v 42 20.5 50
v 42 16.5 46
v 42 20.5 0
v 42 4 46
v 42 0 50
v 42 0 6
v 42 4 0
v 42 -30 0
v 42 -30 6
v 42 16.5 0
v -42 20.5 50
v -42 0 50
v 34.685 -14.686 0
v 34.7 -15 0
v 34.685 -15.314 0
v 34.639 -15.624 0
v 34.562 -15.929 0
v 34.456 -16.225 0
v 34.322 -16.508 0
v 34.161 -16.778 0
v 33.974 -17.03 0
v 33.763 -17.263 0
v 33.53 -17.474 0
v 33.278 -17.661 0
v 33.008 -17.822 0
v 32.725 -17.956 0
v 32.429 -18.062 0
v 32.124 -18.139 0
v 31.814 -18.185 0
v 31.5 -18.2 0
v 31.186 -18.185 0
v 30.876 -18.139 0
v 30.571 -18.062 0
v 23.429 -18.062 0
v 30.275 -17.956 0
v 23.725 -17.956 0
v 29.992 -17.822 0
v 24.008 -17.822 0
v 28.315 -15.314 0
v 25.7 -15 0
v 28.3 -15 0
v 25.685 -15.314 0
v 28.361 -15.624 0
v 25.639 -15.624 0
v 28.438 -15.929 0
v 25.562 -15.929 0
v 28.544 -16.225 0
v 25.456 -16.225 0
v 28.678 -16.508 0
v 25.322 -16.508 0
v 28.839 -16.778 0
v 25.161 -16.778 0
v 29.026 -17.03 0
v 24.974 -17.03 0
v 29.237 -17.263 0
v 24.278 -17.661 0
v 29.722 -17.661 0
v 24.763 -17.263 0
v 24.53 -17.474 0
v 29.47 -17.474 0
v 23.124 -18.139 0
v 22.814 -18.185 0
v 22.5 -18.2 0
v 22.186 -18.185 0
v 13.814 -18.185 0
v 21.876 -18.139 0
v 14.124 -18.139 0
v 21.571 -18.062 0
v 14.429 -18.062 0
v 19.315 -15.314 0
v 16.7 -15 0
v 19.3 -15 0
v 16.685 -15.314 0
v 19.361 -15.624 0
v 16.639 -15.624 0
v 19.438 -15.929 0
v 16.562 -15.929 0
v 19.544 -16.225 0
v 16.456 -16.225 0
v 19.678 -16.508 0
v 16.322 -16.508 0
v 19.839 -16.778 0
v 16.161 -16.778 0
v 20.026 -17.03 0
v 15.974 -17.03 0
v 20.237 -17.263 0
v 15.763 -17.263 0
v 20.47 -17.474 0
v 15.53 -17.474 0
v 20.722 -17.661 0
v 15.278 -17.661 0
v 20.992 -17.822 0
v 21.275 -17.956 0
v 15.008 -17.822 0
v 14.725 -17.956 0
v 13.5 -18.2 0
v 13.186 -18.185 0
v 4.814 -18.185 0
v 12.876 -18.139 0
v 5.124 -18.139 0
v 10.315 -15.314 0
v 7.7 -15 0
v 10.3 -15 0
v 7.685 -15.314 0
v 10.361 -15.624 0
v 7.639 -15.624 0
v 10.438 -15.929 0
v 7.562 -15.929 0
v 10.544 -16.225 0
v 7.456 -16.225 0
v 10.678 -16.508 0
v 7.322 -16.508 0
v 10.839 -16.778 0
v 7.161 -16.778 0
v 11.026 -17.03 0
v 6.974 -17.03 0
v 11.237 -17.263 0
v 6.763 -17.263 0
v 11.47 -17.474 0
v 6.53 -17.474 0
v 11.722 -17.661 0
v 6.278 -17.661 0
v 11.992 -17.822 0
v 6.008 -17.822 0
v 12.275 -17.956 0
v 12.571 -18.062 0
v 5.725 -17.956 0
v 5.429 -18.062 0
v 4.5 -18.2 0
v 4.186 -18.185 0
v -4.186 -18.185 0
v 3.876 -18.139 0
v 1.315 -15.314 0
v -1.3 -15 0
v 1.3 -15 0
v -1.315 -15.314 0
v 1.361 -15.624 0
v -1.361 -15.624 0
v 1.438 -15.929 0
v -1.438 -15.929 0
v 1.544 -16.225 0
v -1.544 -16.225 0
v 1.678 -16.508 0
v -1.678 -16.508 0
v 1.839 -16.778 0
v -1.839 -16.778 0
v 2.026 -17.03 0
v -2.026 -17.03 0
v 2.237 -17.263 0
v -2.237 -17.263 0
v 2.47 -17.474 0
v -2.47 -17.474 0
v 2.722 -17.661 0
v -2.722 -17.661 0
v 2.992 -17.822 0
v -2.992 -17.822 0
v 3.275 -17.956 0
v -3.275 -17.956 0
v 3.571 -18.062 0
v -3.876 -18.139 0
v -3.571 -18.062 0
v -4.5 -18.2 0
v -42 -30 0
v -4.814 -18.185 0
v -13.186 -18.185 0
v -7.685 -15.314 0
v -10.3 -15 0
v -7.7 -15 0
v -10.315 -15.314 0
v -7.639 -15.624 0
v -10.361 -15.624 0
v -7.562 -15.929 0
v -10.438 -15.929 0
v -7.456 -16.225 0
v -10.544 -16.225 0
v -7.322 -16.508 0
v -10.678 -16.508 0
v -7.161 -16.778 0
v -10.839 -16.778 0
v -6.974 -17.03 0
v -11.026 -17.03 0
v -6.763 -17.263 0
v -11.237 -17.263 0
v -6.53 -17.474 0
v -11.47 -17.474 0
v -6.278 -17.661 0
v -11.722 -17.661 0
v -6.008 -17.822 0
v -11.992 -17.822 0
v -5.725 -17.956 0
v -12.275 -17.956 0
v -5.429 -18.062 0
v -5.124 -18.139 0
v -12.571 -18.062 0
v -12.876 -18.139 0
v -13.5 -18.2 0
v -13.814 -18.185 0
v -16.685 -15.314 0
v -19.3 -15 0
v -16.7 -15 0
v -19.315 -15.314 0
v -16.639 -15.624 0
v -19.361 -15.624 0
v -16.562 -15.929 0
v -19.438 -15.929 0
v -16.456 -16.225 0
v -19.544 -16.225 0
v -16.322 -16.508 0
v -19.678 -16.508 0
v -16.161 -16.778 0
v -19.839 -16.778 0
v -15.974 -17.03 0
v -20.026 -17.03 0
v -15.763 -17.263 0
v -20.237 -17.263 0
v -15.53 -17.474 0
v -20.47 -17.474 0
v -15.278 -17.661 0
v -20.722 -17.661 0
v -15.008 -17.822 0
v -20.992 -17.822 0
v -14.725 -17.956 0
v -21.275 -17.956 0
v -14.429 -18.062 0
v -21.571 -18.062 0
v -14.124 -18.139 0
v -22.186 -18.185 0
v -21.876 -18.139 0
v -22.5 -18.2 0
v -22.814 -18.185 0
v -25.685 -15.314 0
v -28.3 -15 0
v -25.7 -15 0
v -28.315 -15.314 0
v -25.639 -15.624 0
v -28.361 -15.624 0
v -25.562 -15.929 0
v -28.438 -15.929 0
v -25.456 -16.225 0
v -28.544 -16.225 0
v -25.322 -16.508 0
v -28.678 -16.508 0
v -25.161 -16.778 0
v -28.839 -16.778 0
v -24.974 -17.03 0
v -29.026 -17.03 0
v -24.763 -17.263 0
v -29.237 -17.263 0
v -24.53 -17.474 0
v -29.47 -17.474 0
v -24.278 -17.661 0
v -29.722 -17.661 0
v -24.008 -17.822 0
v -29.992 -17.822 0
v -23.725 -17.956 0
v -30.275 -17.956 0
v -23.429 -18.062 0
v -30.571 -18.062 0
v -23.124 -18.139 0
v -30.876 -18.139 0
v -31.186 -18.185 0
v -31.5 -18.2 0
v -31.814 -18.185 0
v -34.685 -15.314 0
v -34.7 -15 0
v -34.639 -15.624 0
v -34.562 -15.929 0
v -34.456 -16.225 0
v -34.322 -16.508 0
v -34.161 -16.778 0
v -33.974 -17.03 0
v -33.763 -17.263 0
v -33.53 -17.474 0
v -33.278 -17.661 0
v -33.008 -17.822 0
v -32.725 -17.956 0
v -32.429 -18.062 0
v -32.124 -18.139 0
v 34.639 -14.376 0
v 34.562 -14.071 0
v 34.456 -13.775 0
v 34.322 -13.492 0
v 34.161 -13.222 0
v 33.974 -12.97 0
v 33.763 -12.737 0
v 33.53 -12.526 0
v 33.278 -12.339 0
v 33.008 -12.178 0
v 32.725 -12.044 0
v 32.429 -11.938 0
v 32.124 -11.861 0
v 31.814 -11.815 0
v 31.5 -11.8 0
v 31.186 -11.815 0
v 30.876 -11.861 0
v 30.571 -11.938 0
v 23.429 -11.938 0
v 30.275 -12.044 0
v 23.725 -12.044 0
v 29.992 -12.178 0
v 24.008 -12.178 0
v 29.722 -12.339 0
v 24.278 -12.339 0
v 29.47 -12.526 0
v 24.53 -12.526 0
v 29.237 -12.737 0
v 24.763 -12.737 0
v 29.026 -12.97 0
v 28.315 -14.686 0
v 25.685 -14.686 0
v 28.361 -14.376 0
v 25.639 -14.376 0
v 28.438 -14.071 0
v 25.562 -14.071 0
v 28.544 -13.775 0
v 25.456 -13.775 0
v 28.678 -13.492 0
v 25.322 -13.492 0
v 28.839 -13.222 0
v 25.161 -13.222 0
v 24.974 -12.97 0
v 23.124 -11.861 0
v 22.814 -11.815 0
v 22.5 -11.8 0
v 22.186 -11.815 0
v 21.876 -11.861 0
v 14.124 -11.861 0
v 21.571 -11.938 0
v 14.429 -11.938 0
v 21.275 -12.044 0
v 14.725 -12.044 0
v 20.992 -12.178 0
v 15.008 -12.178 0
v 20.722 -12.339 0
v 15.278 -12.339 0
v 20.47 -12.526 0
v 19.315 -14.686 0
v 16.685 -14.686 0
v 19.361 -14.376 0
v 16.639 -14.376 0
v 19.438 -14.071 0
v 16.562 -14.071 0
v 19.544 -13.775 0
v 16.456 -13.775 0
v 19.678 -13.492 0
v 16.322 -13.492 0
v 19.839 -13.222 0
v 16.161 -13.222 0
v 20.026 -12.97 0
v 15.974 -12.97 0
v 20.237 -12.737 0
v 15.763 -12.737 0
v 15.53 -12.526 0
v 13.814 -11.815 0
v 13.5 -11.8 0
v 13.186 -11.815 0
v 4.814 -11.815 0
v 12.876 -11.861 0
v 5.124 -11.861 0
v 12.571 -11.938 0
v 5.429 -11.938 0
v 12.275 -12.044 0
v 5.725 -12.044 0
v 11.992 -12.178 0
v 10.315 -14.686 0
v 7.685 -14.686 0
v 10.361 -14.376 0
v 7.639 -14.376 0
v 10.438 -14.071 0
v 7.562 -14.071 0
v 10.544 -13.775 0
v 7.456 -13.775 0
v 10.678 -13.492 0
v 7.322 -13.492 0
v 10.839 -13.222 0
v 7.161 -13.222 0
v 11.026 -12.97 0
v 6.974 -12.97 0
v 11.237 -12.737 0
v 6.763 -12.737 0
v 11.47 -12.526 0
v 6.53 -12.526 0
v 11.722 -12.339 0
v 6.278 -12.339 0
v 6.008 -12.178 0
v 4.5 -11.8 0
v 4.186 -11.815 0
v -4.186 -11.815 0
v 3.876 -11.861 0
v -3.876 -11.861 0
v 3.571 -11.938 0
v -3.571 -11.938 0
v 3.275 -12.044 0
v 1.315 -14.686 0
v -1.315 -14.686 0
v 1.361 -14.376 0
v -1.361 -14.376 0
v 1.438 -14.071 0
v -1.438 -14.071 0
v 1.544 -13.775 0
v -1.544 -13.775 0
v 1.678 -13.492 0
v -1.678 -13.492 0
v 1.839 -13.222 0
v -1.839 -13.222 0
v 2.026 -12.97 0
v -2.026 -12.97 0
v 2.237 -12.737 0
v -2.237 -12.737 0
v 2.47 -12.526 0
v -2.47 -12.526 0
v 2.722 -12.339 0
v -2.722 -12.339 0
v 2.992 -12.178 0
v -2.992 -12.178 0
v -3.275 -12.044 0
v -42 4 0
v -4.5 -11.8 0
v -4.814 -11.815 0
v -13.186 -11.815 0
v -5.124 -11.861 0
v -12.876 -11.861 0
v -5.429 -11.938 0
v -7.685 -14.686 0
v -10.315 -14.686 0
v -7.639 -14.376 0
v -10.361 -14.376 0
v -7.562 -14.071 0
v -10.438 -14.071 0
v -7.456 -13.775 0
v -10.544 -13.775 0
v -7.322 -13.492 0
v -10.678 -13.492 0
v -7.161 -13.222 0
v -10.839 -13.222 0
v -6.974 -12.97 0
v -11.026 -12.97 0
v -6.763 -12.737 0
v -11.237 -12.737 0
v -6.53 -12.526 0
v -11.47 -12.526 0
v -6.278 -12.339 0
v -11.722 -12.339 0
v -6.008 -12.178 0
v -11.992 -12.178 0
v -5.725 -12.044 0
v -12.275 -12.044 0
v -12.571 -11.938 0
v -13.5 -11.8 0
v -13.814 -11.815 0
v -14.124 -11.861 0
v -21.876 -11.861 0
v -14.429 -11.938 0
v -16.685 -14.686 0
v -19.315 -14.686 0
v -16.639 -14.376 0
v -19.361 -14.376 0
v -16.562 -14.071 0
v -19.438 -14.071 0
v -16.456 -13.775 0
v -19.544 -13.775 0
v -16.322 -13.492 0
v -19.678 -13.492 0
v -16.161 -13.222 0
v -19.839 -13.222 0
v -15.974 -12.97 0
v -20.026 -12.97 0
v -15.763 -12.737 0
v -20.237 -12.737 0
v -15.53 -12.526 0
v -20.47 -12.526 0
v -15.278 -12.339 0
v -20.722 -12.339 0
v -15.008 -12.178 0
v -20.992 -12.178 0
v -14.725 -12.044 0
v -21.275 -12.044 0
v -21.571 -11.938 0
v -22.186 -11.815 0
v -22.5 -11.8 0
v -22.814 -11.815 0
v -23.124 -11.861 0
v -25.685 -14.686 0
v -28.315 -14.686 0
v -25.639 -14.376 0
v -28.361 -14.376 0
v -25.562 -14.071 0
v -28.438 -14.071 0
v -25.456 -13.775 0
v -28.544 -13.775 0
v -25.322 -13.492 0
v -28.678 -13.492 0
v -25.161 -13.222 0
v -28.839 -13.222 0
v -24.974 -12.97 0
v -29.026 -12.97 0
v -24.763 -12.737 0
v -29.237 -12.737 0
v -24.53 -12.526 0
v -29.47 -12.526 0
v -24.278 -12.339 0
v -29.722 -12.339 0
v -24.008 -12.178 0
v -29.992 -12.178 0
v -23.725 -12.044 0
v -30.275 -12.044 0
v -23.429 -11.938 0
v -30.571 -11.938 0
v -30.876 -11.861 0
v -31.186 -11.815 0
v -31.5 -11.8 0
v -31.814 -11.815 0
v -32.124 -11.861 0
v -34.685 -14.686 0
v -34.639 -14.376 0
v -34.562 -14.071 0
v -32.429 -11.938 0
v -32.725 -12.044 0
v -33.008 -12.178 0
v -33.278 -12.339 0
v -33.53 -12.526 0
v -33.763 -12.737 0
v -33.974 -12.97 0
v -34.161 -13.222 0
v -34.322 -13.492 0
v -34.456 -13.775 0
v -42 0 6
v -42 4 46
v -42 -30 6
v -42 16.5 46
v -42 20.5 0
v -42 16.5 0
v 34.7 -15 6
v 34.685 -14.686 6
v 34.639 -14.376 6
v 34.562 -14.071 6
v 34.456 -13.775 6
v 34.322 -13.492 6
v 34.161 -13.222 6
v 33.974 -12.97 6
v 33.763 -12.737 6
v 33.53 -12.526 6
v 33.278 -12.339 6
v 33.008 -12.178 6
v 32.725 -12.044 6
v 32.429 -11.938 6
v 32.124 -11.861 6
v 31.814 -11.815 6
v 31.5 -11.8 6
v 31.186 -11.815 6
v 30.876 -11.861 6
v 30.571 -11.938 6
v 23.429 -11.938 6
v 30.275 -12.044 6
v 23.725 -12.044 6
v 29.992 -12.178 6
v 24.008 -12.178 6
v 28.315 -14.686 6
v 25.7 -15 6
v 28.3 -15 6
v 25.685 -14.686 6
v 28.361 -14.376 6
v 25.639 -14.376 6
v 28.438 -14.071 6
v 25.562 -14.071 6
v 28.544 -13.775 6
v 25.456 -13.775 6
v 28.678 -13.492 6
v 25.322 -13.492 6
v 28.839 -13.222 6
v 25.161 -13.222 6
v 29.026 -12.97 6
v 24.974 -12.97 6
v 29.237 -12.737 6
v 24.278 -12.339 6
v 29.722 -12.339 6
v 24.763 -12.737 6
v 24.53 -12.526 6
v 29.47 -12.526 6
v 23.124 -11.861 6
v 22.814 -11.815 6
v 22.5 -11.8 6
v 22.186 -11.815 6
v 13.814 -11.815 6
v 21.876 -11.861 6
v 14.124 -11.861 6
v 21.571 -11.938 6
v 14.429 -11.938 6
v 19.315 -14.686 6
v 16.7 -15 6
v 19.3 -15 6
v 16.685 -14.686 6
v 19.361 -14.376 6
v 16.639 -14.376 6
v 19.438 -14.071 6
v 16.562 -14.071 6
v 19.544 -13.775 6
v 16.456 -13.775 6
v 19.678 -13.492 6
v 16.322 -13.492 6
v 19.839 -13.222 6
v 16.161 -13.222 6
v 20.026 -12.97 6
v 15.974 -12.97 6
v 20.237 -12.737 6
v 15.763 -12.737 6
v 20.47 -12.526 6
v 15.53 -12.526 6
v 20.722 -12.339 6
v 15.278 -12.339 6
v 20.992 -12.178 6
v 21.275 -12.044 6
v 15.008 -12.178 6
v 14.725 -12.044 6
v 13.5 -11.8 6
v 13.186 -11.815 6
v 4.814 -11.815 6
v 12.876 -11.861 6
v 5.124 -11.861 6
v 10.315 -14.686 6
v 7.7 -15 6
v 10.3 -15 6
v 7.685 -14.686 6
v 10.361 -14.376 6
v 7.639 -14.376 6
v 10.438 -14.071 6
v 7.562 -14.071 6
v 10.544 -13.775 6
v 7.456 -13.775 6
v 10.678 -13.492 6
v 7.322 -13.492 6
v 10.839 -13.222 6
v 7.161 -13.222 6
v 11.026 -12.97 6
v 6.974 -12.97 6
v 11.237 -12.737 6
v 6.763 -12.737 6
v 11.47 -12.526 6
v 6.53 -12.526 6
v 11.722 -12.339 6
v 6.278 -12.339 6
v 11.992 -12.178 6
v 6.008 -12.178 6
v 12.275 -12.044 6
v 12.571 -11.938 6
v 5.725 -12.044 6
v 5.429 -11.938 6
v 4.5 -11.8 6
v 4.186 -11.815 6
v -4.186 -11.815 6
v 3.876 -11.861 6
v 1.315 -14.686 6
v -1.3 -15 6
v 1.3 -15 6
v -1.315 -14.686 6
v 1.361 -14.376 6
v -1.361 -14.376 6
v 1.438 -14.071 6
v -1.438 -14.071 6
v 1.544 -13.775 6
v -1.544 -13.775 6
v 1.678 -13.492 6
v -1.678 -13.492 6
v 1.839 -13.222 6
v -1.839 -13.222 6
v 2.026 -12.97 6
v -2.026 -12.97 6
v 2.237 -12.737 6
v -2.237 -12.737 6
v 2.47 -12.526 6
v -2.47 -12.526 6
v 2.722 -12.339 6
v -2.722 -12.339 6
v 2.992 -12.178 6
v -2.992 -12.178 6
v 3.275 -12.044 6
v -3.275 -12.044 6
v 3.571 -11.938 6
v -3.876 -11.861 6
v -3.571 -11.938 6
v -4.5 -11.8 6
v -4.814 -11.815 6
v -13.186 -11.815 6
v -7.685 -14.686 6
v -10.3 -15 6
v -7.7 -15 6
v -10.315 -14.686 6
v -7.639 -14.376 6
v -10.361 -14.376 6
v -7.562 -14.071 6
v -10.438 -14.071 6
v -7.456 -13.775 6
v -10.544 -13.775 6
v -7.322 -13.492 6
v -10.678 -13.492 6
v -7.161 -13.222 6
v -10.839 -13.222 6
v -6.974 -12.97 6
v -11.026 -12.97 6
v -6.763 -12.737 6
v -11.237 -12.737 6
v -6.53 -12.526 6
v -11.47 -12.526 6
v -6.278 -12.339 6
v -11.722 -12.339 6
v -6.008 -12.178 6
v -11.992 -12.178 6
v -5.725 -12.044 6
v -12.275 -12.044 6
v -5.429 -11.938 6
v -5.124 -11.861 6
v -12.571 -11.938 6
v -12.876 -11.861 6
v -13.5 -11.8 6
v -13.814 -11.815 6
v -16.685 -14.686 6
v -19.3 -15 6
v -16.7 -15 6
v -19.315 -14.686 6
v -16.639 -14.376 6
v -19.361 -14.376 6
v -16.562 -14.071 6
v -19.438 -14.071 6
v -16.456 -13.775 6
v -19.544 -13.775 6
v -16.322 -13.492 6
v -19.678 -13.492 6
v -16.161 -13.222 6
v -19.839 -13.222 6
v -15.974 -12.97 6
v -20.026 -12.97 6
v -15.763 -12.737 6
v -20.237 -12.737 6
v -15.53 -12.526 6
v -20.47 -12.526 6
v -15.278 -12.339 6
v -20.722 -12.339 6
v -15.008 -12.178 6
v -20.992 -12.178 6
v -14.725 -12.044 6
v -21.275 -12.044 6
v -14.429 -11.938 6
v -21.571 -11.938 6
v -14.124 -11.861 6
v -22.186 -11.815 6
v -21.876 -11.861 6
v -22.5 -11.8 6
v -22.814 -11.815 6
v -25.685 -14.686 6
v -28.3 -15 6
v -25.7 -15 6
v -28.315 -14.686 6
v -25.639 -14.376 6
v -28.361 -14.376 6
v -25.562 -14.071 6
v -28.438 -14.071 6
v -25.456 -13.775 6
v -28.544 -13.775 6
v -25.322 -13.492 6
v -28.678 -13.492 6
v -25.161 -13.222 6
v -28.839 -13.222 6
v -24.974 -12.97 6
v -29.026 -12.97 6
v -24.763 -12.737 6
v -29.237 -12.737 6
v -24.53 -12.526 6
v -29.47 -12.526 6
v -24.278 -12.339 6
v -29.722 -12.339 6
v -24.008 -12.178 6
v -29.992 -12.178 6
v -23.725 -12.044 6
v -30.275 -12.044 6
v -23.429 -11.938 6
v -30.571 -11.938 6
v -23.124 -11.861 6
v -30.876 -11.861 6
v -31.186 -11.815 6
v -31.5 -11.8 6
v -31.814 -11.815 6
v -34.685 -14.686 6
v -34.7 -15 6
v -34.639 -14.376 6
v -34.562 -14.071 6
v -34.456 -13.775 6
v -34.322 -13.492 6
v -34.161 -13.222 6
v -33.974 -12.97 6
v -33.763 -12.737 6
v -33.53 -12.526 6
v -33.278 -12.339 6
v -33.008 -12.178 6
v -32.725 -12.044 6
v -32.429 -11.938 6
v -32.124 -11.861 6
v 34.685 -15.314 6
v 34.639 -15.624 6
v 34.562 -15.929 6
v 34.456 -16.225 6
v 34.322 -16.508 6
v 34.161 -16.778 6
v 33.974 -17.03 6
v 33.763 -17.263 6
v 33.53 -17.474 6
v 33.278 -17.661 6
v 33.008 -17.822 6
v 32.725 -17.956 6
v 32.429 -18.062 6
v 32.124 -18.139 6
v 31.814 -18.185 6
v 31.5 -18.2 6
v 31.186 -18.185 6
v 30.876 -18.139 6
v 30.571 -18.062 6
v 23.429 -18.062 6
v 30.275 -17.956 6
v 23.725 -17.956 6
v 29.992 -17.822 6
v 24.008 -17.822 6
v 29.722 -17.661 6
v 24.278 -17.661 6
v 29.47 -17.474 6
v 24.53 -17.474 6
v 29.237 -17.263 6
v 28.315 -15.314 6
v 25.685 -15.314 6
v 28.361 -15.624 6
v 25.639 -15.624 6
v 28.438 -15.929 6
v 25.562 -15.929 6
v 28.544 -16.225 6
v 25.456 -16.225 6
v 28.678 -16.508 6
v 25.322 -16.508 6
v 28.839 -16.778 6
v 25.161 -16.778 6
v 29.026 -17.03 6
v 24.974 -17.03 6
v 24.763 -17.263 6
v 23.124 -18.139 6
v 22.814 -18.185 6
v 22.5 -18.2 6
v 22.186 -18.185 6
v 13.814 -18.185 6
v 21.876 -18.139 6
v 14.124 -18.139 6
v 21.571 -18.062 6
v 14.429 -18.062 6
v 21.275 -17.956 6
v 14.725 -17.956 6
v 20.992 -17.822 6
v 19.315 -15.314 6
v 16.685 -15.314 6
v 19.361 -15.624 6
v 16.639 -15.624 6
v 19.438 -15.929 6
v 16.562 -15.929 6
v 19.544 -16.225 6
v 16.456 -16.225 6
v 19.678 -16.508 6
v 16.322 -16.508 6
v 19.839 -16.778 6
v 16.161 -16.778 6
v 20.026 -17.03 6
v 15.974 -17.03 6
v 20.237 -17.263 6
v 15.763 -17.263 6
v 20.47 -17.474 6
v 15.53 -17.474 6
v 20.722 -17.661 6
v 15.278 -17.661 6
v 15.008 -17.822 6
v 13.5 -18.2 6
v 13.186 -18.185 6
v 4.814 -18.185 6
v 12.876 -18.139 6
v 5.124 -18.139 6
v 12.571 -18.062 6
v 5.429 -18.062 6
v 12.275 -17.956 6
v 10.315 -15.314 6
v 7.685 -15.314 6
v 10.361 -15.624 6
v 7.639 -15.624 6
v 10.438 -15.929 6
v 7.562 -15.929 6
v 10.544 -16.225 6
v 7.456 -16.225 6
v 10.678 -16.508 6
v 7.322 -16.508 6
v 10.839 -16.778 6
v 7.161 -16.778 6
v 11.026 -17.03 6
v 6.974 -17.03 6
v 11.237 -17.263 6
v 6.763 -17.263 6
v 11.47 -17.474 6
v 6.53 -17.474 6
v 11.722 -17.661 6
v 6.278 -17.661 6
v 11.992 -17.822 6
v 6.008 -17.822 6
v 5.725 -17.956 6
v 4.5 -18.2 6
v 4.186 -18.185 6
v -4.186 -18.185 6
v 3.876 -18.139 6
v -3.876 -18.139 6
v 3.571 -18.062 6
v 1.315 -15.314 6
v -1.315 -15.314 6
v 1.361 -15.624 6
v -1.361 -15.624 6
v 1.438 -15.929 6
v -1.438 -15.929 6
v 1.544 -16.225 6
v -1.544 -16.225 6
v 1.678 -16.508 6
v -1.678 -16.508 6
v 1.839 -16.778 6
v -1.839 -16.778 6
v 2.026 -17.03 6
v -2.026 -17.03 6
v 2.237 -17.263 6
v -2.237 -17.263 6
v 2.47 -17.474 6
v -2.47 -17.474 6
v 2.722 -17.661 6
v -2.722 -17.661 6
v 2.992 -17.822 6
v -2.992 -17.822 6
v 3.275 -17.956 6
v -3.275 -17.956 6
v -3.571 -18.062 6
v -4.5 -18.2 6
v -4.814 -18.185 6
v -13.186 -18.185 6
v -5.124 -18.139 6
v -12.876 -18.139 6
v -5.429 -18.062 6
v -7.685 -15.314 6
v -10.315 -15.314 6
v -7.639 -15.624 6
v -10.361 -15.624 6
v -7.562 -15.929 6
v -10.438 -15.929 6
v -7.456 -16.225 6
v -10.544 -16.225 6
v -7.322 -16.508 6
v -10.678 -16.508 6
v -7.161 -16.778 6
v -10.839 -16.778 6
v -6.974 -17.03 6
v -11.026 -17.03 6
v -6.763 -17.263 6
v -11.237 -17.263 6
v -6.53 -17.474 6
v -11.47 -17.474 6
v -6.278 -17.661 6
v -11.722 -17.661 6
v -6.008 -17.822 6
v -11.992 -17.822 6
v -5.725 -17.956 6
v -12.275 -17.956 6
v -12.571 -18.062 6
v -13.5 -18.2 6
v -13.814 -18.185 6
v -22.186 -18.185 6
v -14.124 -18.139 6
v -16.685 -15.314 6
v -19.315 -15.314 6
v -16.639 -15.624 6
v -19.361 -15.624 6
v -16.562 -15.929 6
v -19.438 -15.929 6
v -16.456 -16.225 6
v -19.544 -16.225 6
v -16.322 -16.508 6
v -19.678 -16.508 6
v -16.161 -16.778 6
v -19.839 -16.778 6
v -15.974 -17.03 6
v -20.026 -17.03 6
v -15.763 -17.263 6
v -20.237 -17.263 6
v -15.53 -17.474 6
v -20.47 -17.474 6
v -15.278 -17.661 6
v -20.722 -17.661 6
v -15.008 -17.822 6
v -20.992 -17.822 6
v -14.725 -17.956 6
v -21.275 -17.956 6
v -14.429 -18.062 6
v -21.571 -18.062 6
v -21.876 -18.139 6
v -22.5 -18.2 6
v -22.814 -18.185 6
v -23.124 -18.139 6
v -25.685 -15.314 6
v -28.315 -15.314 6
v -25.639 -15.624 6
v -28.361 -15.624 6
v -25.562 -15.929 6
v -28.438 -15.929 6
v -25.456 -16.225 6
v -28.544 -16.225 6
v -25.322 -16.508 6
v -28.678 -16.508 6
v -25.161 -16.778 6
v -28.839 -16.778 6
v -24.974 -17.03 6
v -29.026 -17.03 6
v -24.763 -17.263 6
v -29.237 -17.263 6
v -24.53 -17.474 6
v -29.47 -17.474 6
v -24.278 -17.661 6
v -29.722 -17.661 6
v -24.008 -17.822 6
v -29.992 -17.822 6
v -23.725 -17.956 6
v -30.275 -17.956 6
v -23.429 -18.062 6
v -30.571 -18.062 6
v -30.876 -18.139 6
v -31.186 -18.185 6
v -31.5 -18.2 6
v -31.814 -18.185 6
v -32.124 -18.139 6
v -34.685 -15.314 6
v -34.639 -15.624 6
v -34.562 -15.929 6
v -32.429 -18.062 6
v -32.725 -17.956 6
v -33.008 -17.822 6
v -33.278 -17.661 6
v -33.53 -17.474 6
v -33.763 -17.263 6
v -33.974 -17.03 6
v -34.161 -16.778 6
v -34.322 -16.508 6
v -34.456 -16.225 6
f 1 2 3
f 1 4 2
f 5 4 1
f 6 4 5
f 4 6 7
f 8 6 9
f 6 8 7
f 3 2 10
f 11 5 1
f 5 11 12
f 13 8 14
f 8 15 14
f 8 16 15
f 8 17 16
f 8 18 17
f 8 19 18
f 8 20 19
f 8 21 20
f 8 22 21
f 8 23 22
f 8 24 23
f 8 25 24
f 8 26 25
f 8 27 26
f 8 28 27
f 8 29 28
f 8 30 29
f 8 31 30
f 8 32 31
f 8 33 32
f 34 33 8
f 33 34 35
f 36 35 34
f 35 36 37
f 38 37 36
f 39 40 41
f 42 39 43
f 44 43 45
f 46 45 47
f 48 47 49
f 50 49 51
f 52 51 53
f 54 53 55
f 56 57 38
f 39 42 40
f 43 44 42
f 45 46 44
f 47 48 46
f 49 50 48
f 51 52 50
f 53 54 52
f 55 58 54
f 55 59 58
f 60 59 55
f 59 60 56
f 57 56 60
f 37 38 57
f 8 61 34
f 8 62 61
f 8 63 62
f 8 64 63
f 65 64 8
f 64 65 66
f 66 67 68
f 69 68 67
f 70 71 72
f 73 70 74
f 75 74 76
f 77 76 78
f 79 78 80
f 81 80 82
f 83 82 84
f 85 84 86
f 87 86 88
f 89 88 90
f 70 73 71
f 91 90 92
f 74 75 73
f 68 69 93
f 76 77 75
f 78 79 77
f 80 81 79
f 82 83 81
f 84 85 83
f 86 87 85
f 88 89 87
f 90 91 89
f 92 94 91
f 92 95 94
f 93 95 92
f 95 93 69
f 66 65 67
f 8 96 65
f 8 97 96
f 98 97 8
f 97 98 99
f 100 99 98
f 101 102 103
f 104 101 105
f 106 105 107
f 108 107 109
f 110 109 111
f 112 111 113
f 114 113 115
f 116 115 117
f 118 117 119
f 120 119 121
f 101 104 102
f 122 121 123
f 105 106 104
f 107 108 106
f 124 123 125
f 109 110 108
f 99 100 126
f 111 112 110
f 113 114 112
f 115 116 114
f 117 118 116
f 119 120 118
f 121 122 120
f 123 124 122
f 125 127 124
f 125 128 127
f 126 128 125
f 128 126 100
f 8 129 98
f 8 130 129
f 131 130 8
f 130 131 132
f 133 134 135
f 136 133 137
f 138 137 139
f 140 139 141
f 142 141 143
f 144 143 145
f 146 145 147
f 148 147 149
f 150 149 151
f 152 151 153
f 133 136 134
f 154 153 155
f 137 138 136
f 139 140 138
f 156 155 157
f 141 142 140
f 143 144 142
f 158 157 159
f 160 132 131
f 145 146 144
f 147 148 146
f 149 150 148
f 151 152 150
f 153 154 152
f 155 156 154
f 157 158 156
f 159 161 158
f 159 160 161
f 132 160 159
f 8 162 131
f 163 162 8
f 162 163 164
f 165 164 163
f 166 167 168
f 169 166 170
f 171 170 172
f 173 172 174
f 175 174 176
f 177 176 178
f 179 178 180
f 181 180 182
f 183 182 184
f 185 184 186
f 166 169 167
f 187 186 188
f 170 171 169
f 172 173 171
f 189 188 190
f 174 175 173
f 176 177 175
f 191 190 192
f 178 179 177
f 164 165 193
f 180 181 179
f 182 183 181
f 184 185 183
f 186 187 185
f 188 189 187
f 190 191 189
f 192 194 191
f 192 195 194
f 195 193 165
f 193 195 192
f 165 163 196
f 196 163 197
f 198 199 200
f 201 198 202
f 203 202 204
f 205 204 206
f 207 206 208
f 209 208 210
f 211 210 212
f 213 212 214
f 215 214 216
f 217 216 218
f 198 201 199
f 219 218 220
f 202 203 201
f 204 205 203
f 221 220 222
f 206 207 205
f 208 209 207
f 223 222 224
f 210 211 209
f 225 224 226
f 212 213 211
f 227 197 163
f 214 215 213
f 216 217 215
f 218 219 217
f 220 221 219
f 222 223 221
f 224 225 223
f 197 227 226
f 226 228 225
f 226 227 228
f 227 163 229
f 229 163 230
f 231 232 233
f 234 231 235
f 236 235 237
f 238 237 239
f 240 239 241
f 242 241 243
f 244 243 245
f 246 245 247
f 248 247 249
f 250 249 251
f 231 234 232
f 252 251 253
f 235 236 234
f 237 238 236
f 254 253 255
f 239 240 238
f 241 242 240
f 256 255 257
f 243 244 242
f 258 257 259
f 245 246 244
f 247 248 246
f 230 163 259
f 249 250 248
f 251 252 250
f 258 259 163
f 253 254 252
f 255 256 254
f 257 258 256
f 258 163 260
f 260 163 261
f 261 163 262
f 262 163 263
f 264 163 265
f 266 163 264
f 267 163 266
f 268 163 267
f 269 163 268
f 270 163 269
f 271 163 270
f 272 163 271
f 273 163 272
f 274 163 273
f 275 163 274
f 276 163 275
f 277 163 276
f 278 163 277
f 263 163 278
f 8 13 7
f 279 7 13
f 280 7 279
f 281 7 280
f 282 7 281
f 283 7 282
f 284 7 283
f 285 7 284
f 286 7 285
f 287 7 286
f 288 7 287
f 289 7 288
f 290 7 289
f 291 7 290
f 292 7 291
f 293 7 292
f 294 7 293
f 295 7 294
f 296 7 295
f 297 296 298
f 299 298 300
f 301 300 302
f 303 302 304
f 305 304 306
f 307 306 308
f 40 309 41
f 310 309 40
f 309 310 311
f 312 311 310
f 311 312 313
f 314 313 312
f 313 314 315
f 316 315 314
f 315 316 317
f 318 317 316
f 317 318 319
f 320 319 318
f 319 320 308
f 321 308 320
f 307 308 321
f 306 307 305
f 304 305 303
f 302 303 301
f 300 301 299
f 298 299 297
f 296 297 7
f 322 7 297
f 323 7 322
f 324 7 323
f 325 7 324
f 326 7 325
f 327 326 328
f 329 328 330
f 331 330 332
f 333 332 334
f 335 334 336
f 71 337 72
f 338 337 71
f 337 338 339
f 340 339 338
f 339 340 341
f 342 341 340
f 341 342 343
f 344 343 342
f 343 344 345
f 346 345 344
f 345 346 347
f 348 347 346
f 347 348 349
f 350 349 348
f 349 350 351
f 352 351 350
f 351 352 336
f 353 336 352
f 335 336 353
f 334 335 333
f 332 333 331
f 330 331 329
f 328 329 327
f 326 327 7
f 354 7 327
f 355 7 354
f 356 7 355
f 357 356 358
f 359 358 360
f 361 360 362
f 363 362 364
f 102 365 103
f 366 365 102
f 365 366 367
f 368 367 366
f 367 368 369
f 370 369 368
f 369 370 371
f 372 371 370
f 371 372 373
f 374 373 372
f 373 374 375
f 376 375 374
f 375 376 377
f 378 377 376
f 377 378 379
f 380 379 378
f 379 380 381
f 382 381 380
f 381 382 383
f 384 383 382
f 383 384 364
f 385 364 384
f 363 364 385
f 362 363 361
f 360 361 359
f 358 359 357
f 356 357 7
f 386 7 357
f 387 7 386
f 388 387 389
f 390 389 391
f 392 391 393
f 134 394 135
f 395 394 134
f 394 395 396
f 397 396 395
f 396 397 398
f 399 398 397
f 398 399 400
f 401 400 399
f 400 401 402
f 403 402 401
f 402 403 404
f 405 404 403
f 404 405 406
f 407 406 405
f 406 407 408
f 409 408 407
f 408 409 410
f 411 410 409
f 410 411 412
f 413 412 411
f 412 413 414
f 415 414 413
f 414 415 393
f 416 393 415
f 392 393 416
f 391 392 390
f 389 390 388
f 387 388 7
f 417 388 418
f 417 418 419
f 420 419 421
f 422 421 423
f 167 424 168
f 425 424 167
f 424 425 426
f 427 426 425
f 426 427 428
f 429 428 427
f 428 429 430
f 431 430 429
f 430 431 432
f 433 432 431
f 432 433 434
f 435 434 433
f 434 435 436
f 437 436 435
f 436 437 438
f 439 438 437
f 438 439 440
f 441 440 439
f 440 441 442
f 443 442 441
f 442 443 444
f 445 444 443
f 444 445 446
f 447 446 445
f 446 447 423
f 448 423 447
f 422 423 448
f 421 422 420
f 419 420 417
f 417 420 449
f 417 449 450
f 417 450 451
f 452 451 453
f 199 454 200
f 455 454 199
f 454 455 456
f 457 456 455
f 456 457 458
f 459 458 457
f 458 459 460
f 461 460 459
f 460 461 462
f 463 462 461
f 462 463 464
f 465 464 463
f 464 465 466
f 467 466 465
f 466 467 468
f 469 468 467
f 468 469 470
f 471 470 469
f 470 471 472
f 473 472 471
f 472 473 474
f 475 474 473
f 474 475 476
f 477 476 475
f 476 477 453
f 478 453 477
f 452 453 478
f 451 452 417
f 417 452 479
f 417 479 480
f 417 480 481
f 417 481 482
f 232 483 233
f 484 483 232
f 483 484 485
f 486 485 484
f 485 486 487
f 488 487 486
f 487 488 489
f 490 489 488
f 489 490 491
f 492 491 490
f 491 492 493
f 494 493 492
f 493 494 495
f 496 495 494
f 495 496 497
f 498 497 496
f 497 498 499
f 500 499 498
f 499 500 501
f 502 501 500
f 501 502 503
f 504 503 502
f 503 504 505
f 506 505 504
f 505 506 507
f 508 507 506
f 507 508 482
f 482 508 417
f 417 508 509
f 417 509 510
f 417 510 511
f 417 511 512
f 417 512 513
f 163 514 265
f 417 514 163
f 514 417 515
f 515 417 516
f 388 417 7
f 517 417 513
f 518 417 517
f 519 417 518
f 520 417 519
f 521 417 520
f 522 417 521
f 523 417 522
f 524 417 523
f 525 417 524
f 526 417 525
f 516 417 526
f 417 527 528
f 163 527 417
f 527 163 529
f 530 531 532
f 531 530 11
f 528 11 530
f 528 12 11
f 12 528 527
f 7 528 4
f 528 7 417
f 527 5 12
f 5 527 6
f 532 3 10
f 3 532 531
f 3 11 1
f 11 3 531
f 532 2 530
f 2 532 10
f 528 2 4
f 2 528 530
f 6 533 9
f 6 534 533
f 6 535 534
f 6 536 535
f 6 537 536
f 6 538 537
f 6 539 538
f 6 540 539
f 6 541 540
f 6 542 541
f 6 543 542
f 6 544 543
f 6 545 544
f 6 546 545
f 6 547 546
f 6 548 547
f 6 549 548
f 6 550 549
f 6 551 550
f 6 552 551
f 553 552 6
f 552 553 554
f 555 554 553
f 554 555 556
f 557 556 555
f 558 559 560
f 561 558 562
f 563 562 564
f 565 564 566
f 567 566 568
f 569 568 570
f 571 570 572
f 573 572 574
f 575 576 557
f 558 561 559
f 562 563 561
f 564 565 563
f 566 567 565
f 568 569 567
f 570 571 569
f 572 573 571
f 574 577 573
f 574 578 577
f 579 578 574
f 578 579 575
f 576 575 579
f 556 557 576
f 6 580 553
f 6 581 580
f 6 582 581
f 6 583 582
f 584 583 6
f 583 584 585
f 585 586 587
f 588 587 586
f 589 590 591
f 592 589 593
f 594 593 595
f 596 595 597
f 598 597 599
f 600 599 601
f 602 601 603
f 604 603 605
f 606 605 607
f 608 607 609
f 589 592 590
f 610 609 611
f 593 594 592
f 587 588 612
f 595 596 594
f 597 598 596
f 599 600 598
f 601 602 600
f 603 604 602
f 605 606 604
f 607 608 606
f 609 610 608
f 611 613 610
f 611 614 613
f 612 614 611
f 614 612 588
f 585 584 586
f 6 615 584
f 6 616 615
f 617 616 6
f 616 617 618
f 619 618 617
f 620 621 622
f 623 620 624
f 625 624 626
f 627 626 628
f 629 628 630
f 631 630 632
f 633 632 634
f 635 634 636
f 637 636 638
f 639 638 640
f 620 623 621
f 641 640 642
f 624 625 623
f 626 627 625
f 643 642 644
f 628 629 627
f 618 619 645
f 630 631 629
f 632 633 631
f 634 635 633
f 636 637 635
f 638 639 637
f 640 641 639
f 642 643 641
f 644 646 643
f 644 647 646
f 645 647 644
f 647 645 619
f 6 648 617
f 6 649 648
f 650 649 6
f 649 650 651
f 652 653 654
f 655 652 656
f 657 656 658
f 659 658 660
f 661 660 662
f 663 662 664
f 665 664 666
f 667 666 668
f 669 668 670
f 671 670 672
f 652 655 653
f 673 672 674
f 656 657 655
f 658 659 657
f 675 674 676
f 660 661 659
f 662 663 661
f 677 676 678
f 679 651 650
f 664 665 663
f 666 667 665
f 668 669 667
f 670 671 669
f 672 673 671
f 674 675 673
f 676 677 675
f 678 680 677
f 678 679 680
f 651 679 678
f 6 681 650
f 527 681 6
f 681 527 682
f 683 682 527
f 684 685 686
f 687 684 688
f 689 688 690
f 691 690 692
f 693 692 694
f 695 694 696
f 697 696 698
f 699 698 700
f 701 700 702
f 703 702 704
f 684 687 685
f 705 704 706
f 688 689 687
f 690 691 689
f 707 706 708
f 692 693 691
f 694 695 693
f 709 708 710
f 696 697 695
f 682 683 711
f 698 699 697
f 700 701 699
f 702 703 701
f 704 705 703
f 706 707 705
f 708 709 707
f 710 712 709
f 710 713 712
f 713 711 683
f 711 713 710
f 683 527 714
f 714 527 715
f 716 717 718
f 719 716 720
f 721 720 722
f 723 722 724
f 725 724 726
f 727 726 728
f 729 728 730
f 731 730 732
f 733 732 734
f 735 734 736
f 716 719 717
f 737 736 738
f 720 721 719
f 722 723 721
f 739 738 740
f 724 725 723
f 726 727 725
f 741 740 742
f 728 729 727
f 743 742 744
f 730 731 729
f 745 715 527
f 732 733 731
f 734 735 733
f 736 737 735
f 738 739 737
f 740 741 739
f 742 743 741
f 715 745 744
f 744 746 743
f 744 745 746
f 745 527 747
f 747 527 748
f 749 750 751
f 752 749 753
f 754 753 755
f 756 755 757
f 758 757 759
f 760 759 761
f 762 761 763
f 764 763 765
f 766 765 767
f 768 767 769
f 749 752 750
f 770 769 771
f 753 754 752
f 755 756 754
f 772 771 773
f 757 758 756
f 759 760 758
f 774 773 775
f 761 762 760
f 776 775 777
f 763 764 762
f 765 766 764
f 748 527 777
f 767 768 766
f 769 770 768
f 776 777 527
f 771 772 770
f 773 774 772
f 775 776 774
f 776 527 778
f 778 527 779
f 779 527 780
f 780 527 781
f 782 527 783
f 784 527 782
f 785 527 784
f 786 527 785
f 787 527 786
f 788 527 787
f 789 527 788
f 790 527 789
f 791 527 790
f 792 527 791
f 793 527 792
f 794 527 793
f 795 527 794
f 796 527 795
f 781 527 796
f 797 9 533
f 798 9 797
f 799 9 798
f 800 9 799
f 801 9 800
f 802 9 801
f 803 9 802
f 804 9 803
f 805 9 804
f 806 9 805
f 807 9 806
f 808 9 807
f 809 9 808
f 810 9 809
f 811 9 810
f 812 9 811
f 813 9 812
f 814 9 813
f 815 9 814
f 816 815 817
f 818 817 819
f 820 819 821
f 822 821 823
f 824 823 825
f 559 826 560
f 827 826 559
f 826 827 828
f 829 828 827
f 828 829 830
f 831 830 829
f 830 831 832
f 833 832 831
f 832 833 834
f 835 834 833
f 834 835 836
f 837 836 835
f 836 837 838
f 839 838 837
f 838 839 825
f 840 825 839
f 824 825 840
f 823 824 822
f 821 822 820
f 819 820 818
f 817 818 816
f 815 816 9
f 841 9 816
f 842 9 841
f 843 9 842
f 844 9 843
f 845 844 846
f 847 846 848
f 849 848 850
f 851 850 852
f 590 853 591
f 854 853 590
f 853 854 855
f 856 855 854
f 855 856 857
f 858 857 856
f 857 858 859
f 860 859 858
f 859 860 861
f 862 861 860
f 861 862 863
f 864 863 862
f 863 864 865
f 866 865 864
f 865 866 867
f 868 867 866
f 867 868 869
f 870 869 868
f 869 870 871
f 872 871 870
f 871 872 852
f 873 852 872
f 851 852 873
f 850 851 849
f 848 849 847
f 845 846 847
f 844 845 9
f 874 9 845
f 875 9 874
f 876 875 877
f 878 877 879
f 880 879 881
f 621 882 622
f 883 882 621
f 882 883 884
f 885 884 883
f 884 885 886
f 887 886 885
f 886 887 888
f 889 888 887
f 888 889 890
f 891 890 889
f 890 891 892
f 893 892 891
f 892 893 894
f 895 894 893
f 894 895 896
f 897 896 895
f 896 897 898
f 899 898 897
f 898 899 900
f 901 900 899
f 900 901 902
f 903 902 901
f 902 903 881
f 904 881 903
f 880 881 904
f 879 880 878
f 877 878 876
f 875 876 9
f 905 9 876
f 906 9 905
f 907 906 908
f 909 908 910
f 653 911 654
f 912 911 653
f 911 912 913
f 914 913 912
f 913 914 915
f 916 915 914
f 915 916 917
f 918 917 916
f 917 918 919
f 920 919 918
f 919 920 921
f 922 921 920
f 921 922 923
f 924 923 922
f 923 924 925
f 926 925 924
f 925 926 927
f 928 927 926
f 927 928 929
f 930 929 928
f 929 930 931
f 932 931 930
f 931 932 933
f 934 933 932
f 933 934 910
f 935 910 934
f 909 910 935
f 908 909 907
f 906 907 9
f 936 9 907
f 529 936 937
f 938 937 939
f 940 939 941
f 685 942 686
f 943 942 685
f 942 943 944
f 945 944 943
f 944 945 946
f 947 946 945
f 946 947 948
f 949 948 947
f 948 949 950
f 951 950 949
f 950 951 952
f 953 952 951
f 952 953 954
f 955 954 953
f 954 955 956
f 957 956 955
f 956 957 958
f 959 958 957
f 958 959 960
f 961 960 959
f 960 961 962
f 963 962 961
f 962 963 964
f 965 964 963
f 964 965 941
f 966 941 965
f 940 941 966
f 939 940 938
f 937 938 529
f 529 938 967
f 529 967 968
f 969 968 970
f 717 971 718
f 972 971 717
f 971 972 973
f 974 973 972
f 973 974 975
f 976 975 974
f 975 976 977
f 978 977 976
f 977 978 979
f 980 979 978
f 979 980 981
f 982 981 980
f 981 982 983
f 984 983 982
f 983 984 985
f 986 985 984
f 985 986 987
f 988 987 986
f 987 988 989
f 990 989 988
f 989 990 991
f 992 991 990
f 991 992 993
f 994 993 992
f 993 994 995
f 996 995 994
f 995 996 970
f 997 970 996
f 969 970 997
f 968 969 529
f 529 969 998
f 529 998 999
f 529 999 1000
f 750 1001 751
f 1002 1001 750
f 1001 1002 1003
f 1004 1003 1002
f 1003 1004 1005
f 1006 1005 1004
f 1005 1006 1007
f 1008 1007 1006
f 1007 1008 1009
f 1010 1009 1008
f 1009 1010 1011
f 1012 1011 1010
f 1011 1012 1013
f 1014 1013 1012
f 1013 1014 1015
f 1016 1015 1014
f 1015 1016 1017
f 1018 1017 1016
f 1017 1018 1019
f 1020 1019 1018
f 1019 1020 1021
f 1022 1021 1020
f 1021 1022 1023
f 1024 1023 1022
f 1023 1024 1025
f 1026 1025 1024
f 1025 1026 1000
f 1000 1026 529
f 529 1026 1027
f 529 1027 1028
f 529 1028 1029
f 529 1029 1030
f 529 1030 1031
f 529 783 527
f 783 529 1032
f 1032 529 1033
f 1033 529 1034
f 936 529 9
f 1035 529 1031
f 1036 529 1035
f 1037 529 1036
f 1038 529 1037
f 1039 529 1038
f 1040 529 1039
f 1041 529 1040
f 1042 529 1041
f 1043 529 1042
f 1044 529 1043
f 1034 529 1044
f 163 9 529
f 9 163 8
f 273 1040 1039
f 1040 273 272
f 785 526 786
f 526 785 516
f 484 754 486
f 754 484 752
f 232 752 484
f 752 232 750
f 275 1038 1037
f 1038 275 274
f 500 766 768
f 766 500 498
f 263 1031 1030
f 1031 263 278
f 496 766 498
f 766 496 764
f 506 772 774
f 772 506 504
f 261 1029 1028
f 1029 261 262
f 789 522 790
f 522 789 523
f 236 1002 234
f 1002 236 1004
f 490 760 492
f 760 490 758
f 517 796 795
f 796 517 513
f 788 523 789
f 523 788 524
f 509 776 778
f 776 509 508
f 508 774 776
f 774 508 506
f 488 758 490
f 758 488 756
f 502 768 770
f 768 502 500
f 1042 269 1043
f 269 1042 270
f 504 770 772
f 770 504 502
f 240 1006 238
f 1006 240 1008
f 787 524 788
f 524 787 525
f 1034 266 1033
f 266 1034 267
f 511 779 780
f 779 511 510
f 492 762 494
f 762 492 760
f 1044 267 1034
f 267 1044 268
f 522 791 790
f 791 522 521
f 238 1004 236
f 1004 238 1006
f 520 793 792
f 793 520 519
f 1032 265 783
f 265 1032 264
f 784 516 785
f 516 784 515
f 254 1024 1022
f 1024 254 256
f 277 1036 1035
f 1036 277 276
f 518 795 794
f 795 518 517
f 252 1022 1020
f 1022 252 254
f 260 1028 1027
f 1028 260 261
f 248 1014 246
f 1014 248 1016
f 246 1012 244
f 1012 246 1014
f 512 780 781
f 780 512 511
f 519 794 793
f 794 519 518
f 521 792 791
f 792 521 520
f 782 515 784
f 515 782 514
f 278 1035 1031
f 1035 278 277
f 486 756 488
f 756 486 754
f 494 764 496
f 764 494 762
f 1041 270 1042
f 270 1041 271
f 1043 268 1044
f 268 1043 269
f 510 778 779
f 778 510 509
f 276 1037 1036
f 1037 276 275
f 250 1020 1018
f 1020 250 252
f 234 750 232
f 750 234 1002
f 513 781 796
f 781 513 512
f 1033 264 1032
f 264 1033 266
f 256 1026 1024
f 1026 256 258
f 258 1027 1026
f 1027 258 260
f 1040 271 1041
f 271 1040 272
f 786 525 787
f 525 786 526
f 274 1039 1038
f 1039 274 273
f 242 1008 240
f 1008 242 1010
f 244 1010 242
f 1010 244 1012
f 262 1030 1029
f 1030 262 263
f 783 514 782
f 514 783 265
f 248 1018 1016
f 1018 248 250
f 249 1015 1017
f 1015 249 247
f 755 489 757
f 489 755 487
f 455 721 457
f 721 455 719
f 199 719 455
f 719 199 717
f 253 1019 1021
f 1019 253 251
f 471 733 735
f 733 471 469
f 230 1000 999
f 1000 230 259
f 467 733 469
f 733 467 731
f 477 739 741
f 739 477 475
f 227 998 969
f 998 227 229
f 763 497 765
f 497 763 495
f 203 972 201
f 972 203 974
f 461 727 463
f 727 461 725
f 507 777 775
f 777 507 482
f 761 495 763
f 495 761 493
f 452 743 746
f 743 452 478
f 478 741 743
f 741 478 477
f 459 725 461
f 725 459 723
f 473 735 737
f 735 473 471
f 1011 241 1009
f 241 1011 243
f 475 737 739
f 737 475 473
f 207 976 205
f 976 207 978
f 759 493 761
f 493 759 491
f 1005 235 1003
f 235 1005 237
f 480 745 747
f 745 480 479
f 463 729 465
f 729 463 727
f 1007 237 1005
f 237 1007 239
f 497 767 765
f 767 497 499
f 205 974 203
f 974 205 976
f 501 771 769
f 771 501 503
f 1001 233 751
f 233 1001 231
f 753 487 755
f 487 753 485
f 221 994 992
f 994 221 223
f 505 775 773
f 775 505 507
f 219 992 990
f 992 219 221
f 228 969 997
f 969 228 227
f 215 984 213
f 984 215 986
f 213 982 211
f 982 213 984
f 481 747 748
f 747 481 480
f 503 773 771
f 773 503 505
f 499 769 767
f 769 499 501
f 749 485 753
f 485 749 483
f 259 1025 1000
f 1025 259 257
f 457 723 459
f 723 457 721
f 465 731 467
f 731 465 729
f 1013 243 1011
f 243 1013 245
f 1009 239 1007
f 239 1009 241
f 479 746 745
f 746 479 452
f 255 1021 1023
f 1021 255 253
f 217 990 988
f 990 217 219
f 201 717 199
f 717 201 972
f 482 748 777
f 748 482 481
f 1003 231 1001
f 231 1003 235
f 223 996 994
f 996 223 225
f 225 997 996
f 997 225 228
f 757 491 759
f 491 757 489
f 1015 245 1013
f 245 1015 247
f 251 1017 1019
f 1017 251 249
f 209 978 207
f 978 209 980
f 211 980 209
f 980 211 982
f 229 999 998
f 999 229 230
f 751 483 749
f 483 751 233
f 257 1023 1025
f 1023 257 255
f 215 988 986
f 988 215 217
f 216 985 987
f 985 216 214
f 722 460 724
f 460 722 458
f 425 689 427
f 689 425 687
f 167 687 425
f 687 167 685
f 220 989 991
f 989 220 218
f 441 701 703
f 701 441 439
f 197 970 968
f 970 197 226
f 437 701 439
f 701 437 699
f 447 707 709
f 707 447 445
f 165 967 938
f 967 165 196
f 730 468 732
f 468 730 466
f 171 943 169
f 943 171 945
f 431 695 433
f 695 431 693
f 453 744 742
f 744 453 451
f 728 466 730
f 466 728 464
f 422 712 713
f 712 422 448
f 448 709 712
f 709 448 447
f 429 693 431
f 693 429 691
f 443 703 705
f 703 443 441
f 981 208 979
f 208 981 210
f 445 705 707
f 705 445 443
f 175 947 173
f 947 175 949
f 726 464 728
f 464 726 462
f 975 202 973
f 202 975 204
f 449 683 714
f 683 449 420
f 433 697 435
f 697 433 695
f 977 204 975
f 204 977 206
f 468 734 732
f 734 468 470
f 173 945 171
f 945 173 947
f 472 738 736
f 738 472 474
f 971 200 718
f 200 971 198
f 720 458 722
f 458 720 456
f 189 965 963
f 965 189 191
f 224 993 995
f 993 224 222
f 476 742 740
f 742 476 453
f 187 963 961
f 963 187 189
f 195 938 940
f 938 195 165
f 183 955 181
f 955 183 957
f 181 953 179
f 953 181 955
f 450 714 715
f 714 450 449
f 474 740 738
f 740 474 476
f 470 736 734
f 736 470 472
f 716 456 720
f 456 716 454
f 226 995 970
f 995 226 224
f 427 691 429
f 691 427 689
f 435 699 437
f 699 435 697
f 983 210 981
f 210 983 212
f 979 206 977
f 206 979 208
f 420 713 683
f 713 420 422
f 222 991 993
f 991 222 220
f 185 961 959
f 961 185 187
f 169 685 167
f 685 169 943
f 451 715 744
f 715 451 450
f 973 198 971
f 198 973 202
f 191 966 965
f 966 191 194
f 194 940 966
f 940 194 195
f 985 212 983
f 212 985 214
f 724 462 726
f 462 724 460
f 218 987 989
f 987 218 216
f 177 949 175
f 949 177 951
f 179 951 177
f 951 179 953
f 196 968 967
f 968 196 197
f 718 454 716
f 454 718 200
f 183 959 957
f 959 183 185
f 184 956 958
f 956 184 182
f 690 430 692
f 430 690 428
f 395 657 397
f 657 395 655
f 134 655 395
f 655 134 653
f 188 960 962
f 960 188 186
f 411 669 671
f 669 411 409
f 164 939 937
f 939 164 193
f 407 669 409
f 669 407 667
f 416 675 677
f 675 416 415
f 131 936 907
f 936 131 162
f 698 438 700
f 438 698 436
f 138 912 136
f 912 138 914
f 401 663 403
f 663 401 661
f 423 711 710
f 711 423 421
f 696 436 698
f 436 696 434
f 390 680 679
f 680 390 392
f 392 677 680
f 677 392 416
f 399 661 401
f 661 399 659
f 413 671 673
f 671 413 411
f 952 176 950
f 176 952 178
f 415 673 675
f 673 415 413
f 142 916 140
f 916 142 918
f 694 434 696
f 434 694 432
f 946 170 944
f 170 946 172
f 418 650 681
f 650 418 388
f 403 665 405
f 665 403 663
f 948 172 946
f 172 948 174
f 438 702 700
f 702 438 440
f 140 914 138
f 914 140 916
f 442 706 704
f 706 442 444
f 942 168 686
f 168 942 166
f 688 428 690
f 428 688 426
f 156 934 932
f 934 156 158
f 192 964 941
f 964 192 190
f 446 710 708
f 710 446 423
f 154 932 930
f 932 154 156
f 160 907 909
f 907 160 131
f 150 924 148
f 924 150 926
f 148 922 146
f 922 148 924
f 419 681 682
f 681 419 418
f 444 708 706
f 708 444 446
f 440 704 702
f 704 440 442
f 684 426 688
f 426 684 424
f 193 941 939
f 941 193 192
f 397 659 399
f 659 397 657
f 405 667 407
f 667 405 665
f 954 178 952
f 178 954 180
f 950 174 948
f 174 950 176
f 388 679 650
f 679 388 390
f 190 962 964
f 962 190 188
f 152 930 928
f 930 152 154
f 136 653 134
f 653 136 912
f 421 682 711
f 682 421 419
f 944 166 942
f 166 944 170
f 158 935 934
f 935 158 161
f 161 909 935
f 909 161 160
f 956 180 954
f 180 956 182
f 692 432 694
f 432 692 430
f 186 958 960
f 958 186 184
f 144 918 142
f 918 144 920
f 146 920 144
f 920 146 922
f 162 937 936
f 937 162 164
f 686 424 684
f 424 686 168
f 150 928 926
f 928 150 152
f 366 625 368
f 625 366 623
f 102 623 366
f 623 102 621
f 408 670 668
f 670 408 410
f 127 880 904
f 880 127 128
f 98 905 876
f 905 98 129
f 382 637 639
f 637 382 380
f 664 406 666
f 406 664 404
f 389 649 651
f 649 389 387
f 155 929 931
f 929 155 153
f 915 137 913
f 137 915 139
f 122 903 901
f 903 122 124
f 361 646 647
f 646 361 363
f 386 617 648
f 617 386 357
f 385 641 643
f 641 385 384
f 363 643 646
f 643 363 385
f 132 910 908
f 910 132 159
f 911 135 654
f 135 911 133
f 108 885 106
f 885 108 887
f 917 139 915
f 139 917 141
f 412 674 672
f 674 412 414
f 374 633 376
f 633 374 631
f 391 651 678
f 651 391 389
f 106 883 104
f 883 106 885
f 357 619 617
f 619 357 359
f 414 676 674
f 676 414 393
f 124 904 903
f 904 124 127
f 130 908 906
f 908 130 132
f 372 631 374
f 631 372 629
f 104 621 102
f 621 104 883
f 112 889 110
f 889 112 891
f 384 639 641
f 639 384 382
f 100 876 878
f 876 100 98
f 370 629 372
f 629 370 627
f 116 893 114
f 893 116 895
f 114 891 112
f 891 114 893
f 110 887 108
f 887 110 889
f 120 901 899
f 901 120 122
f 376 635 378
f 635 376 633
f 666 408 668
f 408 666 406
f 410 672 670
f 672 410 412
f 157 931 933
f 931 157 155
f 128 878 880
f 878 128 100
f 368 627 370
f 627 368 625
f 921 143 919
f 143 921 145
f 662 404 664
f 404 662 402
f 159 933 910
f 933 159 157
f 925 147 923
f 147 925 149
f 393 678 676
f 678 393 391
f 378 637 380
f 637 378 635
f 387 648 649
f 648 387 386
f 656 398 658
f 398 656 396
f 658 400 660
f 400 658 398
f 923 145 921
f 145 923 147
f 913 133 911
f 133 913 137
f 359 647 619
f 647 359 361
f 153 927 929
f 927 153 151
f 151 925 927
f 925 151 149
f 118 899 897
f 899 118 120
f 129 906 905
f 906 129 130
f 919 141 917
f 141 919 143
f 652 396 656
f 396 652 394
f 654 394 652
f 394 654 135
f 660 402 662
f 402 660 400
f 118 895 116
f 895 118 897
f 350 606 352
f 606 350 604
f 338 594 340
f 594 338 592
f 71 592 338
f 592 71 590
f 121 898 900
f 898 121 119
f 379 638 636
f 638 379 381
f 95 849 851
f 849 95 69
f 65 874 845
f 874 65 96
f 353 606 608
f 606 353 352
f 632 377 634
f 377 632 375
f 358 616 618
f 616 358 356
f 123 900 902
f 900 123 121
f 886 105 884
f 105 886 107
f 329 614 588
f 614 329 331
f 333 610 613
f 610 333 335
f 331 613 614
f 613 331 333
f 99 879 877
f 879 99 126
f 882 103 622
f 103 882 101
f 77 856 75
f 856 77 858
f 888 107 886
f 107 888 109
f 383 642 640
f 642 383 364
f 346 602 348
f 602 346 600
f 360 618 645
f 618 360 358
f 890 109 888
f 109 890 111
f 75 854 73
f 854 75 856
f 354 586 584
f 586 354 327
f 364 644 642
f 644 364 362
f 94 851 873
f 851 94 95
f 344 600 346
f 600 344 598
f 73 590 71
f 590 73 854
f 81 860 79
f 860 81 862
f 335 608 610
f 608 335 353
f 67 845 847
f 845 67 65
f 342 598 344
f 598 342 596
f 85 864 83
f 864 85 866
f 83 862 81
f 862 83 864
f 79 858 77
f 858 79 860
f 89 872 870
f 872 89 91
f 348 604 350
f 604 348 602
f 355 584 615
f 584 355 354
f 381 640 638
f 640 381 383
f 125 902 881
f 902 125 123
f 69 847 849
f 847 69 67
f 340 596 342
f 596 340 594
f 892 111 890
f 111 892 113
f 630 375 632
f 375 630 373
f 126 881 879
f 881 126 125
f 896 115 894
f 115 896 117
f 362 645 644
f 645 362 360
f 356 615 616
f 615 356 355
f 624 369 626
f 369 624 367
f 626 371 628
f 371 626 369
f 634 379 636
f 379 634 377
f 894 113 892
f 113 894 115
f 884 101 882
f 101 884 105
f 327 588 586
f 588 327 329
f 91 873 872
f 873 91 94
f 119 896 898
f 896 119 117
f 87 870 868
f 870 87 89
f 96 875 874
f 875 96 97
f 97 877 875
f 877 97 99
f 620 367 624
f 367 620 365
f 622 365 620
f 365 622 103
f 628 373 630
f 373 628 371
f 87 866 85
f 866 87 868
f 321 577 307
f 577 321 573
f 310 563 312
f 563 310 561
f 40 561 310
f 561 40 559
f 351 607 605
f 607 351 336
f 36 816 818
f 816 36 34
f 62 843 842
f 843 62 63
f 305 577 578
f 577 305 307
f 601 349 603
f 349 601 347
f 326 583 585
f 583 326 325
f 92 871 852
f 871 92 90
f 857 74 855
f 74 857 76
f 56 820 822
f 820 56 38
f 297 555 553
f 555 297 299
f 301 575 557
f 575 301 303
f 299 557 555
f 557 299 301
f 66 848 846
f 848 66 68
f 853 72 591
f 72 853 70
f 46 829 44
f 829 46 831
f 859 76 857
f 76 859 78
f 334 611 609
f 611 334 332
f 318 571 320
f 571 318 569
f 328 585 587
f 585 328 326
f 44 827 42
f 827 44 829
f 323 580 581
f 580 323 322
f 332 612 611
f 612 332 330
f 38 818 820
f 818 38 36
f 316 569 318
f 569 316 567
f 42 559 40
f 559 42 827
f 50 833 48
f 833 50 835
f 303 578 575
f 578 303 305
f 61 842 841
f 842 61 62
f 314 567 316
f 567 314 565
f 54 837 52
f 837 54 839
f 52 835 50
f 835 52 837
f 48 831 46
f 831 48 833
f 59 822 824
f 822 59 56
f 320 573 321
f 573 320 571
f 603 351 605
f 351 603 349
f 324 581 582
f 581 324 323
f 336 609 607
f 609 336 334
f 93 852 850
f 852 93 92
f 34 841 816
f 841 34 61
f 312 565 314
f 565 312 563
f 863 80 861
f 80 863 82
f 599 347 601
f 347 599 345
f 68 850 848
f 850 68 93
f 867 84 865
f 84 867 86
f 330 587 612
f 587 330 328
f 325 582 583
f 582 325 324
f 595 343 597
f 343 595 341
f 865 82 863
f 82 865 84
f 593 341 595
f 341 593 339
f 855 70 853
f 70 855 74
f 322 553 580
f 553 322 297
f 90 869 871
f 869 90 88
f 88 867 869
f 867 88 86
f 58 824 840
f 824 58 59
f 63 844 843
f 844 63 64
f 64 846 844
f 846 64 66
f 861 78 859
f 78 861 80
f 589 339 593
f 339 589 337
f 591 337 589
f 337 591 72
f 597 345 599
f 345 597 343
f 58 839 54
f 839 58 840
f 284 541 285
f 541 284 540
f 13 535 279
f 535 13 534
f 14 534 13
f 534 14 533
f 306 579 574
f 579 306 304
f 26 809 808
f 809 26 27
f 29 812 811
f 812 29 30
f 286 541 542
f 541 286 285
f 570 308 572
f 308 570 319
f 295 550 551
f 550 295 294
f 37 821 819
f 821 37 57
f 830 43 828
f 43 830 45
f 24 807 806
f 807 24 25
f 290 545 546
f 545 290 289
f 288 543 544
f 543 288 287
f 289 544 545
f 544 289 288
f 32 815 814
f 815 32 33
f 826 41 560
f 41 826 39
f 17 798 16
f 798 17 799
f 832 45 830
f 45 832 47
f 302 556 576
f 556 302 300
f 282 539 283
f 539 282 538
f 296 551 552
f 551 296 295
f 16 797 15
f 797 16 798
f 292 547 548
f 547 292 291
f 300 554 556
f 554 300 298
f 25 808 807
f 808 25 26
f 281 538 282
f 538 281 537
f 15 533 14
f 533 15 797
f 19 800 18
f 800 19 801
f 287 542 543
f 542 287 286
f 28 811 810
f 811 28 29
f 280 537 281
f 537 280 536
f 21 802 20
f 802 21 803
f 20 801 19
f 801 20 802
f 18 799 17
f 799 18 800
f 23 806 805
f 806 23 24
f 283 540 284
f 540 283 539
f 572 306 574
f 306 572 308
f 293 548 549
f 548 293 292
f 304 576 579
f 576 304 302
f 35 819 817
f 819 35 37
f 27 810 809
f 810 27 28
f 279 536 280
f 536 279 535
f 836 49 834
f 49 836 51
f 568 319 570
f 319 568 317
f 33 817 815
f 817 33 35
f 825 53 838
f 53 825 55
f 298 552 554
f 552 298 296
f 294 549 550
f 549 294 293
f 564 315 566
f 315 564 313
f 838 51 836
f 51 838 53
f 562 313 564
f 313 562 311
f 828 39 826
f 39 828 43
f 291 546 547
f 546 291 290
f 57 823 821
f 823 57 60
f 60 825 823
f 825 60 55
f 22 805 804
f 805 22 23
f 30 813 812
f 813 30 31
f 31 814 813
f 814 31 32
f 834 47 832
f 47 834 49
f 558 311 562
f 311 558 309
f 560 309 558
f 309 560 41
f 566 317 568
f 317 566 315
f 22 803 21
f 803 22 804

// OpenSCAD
// PCR Strip Holder for Ice Bucket - Corrected
// Designed to hang over a 12mm wall and hold an 8-tube PCR strip.

// --- Dimensions ---
length_x      = 84.0;    // Total extrusion length along X
inner_leg_y_max = 4.0;    // Top of inner leg Y
outer_leg_y_min = 16.5;   // Bottom of outer leg Y
outer_leg_y_max = 20.5;   // Top of outer leg Y
leg_height    = 50.0;    // Height of the vertical legs
bridge_z_min   = 46.0;    // Bottom of the top bridge Z
bridge_z_max   = 50.0;    // Top of the top bridge Z
ledge_thick   = 6.0;     // Thickness of the ledge (Z: 0 to 6)
ledge_width   = 30.0;    // How far the ledge extends into the ice (-Y direction)
tube_hole_d    = 6.4;    // Diameter of the PCR tube holes
tube_hole_y   = -15.0;   // Y-position of the tube holes
tube_hole_x_p = 9.0;     // Pitch/spacing between tube holes along X
num_tubes     = 8;        // Number of tubes

$fn = 64;

// --- Construction ---

module holder_body() {
    // 1. Inner Leg: Y from 0 to 4, Z from 0 to 50
    translate([-length_x/2, 0, 0]) 
        cube([length_x, inner_leg_y_max, leg_height]);
    
    // 2. Outer Leg: Y from 16.5 to 20.5, Z from 0 to 50
    translate([-length_x/2, outer_leg_y_min, 0]) 
        cube([length_x, outer_leg_y_max - outer_leg_y_min, leg_height]);
    
    // 3. Bridge: Y from 4 to 16.5, Z from 46 to 50
    translate([-length_x/2, inner_leg_y_max, bridge_z_min]) 
        cube([length_x, outer_leg_y_min - inner_leg_y_max, bridge_z_max - bridge_z_min]);
    
    // 4. Ledge: Y from 0 to -30, Z from 0 to 6
    translate([-length_x/2, -ledge_width, 0]) 
        cube([length_x, ledge_width, ledge_thick]);
}

// Final Render with Hole Subtraction
difference() {
    holder_body();
    
    // Subtract the tube holes from the ledge
    // Holes are centered along X. 
    // Total length of holes span: (num_tubes - 1) * tube_hole_x_p
    for (i = [0 : num_tubes - 1]) {
        // Calculate X position to center the grid of 8 holes on X=0
        x_pos = (i - (num_tubes - 1) / 2) * tube_hole_x_p;
        
        // Translate to the hole center and extend slightly in Z to ensure clean cut
        translate([x_pos, tube_hole_y, -1]) 
            cylinder(h = ledge_thick + 2, d = tube_hole_d);
    }
}
